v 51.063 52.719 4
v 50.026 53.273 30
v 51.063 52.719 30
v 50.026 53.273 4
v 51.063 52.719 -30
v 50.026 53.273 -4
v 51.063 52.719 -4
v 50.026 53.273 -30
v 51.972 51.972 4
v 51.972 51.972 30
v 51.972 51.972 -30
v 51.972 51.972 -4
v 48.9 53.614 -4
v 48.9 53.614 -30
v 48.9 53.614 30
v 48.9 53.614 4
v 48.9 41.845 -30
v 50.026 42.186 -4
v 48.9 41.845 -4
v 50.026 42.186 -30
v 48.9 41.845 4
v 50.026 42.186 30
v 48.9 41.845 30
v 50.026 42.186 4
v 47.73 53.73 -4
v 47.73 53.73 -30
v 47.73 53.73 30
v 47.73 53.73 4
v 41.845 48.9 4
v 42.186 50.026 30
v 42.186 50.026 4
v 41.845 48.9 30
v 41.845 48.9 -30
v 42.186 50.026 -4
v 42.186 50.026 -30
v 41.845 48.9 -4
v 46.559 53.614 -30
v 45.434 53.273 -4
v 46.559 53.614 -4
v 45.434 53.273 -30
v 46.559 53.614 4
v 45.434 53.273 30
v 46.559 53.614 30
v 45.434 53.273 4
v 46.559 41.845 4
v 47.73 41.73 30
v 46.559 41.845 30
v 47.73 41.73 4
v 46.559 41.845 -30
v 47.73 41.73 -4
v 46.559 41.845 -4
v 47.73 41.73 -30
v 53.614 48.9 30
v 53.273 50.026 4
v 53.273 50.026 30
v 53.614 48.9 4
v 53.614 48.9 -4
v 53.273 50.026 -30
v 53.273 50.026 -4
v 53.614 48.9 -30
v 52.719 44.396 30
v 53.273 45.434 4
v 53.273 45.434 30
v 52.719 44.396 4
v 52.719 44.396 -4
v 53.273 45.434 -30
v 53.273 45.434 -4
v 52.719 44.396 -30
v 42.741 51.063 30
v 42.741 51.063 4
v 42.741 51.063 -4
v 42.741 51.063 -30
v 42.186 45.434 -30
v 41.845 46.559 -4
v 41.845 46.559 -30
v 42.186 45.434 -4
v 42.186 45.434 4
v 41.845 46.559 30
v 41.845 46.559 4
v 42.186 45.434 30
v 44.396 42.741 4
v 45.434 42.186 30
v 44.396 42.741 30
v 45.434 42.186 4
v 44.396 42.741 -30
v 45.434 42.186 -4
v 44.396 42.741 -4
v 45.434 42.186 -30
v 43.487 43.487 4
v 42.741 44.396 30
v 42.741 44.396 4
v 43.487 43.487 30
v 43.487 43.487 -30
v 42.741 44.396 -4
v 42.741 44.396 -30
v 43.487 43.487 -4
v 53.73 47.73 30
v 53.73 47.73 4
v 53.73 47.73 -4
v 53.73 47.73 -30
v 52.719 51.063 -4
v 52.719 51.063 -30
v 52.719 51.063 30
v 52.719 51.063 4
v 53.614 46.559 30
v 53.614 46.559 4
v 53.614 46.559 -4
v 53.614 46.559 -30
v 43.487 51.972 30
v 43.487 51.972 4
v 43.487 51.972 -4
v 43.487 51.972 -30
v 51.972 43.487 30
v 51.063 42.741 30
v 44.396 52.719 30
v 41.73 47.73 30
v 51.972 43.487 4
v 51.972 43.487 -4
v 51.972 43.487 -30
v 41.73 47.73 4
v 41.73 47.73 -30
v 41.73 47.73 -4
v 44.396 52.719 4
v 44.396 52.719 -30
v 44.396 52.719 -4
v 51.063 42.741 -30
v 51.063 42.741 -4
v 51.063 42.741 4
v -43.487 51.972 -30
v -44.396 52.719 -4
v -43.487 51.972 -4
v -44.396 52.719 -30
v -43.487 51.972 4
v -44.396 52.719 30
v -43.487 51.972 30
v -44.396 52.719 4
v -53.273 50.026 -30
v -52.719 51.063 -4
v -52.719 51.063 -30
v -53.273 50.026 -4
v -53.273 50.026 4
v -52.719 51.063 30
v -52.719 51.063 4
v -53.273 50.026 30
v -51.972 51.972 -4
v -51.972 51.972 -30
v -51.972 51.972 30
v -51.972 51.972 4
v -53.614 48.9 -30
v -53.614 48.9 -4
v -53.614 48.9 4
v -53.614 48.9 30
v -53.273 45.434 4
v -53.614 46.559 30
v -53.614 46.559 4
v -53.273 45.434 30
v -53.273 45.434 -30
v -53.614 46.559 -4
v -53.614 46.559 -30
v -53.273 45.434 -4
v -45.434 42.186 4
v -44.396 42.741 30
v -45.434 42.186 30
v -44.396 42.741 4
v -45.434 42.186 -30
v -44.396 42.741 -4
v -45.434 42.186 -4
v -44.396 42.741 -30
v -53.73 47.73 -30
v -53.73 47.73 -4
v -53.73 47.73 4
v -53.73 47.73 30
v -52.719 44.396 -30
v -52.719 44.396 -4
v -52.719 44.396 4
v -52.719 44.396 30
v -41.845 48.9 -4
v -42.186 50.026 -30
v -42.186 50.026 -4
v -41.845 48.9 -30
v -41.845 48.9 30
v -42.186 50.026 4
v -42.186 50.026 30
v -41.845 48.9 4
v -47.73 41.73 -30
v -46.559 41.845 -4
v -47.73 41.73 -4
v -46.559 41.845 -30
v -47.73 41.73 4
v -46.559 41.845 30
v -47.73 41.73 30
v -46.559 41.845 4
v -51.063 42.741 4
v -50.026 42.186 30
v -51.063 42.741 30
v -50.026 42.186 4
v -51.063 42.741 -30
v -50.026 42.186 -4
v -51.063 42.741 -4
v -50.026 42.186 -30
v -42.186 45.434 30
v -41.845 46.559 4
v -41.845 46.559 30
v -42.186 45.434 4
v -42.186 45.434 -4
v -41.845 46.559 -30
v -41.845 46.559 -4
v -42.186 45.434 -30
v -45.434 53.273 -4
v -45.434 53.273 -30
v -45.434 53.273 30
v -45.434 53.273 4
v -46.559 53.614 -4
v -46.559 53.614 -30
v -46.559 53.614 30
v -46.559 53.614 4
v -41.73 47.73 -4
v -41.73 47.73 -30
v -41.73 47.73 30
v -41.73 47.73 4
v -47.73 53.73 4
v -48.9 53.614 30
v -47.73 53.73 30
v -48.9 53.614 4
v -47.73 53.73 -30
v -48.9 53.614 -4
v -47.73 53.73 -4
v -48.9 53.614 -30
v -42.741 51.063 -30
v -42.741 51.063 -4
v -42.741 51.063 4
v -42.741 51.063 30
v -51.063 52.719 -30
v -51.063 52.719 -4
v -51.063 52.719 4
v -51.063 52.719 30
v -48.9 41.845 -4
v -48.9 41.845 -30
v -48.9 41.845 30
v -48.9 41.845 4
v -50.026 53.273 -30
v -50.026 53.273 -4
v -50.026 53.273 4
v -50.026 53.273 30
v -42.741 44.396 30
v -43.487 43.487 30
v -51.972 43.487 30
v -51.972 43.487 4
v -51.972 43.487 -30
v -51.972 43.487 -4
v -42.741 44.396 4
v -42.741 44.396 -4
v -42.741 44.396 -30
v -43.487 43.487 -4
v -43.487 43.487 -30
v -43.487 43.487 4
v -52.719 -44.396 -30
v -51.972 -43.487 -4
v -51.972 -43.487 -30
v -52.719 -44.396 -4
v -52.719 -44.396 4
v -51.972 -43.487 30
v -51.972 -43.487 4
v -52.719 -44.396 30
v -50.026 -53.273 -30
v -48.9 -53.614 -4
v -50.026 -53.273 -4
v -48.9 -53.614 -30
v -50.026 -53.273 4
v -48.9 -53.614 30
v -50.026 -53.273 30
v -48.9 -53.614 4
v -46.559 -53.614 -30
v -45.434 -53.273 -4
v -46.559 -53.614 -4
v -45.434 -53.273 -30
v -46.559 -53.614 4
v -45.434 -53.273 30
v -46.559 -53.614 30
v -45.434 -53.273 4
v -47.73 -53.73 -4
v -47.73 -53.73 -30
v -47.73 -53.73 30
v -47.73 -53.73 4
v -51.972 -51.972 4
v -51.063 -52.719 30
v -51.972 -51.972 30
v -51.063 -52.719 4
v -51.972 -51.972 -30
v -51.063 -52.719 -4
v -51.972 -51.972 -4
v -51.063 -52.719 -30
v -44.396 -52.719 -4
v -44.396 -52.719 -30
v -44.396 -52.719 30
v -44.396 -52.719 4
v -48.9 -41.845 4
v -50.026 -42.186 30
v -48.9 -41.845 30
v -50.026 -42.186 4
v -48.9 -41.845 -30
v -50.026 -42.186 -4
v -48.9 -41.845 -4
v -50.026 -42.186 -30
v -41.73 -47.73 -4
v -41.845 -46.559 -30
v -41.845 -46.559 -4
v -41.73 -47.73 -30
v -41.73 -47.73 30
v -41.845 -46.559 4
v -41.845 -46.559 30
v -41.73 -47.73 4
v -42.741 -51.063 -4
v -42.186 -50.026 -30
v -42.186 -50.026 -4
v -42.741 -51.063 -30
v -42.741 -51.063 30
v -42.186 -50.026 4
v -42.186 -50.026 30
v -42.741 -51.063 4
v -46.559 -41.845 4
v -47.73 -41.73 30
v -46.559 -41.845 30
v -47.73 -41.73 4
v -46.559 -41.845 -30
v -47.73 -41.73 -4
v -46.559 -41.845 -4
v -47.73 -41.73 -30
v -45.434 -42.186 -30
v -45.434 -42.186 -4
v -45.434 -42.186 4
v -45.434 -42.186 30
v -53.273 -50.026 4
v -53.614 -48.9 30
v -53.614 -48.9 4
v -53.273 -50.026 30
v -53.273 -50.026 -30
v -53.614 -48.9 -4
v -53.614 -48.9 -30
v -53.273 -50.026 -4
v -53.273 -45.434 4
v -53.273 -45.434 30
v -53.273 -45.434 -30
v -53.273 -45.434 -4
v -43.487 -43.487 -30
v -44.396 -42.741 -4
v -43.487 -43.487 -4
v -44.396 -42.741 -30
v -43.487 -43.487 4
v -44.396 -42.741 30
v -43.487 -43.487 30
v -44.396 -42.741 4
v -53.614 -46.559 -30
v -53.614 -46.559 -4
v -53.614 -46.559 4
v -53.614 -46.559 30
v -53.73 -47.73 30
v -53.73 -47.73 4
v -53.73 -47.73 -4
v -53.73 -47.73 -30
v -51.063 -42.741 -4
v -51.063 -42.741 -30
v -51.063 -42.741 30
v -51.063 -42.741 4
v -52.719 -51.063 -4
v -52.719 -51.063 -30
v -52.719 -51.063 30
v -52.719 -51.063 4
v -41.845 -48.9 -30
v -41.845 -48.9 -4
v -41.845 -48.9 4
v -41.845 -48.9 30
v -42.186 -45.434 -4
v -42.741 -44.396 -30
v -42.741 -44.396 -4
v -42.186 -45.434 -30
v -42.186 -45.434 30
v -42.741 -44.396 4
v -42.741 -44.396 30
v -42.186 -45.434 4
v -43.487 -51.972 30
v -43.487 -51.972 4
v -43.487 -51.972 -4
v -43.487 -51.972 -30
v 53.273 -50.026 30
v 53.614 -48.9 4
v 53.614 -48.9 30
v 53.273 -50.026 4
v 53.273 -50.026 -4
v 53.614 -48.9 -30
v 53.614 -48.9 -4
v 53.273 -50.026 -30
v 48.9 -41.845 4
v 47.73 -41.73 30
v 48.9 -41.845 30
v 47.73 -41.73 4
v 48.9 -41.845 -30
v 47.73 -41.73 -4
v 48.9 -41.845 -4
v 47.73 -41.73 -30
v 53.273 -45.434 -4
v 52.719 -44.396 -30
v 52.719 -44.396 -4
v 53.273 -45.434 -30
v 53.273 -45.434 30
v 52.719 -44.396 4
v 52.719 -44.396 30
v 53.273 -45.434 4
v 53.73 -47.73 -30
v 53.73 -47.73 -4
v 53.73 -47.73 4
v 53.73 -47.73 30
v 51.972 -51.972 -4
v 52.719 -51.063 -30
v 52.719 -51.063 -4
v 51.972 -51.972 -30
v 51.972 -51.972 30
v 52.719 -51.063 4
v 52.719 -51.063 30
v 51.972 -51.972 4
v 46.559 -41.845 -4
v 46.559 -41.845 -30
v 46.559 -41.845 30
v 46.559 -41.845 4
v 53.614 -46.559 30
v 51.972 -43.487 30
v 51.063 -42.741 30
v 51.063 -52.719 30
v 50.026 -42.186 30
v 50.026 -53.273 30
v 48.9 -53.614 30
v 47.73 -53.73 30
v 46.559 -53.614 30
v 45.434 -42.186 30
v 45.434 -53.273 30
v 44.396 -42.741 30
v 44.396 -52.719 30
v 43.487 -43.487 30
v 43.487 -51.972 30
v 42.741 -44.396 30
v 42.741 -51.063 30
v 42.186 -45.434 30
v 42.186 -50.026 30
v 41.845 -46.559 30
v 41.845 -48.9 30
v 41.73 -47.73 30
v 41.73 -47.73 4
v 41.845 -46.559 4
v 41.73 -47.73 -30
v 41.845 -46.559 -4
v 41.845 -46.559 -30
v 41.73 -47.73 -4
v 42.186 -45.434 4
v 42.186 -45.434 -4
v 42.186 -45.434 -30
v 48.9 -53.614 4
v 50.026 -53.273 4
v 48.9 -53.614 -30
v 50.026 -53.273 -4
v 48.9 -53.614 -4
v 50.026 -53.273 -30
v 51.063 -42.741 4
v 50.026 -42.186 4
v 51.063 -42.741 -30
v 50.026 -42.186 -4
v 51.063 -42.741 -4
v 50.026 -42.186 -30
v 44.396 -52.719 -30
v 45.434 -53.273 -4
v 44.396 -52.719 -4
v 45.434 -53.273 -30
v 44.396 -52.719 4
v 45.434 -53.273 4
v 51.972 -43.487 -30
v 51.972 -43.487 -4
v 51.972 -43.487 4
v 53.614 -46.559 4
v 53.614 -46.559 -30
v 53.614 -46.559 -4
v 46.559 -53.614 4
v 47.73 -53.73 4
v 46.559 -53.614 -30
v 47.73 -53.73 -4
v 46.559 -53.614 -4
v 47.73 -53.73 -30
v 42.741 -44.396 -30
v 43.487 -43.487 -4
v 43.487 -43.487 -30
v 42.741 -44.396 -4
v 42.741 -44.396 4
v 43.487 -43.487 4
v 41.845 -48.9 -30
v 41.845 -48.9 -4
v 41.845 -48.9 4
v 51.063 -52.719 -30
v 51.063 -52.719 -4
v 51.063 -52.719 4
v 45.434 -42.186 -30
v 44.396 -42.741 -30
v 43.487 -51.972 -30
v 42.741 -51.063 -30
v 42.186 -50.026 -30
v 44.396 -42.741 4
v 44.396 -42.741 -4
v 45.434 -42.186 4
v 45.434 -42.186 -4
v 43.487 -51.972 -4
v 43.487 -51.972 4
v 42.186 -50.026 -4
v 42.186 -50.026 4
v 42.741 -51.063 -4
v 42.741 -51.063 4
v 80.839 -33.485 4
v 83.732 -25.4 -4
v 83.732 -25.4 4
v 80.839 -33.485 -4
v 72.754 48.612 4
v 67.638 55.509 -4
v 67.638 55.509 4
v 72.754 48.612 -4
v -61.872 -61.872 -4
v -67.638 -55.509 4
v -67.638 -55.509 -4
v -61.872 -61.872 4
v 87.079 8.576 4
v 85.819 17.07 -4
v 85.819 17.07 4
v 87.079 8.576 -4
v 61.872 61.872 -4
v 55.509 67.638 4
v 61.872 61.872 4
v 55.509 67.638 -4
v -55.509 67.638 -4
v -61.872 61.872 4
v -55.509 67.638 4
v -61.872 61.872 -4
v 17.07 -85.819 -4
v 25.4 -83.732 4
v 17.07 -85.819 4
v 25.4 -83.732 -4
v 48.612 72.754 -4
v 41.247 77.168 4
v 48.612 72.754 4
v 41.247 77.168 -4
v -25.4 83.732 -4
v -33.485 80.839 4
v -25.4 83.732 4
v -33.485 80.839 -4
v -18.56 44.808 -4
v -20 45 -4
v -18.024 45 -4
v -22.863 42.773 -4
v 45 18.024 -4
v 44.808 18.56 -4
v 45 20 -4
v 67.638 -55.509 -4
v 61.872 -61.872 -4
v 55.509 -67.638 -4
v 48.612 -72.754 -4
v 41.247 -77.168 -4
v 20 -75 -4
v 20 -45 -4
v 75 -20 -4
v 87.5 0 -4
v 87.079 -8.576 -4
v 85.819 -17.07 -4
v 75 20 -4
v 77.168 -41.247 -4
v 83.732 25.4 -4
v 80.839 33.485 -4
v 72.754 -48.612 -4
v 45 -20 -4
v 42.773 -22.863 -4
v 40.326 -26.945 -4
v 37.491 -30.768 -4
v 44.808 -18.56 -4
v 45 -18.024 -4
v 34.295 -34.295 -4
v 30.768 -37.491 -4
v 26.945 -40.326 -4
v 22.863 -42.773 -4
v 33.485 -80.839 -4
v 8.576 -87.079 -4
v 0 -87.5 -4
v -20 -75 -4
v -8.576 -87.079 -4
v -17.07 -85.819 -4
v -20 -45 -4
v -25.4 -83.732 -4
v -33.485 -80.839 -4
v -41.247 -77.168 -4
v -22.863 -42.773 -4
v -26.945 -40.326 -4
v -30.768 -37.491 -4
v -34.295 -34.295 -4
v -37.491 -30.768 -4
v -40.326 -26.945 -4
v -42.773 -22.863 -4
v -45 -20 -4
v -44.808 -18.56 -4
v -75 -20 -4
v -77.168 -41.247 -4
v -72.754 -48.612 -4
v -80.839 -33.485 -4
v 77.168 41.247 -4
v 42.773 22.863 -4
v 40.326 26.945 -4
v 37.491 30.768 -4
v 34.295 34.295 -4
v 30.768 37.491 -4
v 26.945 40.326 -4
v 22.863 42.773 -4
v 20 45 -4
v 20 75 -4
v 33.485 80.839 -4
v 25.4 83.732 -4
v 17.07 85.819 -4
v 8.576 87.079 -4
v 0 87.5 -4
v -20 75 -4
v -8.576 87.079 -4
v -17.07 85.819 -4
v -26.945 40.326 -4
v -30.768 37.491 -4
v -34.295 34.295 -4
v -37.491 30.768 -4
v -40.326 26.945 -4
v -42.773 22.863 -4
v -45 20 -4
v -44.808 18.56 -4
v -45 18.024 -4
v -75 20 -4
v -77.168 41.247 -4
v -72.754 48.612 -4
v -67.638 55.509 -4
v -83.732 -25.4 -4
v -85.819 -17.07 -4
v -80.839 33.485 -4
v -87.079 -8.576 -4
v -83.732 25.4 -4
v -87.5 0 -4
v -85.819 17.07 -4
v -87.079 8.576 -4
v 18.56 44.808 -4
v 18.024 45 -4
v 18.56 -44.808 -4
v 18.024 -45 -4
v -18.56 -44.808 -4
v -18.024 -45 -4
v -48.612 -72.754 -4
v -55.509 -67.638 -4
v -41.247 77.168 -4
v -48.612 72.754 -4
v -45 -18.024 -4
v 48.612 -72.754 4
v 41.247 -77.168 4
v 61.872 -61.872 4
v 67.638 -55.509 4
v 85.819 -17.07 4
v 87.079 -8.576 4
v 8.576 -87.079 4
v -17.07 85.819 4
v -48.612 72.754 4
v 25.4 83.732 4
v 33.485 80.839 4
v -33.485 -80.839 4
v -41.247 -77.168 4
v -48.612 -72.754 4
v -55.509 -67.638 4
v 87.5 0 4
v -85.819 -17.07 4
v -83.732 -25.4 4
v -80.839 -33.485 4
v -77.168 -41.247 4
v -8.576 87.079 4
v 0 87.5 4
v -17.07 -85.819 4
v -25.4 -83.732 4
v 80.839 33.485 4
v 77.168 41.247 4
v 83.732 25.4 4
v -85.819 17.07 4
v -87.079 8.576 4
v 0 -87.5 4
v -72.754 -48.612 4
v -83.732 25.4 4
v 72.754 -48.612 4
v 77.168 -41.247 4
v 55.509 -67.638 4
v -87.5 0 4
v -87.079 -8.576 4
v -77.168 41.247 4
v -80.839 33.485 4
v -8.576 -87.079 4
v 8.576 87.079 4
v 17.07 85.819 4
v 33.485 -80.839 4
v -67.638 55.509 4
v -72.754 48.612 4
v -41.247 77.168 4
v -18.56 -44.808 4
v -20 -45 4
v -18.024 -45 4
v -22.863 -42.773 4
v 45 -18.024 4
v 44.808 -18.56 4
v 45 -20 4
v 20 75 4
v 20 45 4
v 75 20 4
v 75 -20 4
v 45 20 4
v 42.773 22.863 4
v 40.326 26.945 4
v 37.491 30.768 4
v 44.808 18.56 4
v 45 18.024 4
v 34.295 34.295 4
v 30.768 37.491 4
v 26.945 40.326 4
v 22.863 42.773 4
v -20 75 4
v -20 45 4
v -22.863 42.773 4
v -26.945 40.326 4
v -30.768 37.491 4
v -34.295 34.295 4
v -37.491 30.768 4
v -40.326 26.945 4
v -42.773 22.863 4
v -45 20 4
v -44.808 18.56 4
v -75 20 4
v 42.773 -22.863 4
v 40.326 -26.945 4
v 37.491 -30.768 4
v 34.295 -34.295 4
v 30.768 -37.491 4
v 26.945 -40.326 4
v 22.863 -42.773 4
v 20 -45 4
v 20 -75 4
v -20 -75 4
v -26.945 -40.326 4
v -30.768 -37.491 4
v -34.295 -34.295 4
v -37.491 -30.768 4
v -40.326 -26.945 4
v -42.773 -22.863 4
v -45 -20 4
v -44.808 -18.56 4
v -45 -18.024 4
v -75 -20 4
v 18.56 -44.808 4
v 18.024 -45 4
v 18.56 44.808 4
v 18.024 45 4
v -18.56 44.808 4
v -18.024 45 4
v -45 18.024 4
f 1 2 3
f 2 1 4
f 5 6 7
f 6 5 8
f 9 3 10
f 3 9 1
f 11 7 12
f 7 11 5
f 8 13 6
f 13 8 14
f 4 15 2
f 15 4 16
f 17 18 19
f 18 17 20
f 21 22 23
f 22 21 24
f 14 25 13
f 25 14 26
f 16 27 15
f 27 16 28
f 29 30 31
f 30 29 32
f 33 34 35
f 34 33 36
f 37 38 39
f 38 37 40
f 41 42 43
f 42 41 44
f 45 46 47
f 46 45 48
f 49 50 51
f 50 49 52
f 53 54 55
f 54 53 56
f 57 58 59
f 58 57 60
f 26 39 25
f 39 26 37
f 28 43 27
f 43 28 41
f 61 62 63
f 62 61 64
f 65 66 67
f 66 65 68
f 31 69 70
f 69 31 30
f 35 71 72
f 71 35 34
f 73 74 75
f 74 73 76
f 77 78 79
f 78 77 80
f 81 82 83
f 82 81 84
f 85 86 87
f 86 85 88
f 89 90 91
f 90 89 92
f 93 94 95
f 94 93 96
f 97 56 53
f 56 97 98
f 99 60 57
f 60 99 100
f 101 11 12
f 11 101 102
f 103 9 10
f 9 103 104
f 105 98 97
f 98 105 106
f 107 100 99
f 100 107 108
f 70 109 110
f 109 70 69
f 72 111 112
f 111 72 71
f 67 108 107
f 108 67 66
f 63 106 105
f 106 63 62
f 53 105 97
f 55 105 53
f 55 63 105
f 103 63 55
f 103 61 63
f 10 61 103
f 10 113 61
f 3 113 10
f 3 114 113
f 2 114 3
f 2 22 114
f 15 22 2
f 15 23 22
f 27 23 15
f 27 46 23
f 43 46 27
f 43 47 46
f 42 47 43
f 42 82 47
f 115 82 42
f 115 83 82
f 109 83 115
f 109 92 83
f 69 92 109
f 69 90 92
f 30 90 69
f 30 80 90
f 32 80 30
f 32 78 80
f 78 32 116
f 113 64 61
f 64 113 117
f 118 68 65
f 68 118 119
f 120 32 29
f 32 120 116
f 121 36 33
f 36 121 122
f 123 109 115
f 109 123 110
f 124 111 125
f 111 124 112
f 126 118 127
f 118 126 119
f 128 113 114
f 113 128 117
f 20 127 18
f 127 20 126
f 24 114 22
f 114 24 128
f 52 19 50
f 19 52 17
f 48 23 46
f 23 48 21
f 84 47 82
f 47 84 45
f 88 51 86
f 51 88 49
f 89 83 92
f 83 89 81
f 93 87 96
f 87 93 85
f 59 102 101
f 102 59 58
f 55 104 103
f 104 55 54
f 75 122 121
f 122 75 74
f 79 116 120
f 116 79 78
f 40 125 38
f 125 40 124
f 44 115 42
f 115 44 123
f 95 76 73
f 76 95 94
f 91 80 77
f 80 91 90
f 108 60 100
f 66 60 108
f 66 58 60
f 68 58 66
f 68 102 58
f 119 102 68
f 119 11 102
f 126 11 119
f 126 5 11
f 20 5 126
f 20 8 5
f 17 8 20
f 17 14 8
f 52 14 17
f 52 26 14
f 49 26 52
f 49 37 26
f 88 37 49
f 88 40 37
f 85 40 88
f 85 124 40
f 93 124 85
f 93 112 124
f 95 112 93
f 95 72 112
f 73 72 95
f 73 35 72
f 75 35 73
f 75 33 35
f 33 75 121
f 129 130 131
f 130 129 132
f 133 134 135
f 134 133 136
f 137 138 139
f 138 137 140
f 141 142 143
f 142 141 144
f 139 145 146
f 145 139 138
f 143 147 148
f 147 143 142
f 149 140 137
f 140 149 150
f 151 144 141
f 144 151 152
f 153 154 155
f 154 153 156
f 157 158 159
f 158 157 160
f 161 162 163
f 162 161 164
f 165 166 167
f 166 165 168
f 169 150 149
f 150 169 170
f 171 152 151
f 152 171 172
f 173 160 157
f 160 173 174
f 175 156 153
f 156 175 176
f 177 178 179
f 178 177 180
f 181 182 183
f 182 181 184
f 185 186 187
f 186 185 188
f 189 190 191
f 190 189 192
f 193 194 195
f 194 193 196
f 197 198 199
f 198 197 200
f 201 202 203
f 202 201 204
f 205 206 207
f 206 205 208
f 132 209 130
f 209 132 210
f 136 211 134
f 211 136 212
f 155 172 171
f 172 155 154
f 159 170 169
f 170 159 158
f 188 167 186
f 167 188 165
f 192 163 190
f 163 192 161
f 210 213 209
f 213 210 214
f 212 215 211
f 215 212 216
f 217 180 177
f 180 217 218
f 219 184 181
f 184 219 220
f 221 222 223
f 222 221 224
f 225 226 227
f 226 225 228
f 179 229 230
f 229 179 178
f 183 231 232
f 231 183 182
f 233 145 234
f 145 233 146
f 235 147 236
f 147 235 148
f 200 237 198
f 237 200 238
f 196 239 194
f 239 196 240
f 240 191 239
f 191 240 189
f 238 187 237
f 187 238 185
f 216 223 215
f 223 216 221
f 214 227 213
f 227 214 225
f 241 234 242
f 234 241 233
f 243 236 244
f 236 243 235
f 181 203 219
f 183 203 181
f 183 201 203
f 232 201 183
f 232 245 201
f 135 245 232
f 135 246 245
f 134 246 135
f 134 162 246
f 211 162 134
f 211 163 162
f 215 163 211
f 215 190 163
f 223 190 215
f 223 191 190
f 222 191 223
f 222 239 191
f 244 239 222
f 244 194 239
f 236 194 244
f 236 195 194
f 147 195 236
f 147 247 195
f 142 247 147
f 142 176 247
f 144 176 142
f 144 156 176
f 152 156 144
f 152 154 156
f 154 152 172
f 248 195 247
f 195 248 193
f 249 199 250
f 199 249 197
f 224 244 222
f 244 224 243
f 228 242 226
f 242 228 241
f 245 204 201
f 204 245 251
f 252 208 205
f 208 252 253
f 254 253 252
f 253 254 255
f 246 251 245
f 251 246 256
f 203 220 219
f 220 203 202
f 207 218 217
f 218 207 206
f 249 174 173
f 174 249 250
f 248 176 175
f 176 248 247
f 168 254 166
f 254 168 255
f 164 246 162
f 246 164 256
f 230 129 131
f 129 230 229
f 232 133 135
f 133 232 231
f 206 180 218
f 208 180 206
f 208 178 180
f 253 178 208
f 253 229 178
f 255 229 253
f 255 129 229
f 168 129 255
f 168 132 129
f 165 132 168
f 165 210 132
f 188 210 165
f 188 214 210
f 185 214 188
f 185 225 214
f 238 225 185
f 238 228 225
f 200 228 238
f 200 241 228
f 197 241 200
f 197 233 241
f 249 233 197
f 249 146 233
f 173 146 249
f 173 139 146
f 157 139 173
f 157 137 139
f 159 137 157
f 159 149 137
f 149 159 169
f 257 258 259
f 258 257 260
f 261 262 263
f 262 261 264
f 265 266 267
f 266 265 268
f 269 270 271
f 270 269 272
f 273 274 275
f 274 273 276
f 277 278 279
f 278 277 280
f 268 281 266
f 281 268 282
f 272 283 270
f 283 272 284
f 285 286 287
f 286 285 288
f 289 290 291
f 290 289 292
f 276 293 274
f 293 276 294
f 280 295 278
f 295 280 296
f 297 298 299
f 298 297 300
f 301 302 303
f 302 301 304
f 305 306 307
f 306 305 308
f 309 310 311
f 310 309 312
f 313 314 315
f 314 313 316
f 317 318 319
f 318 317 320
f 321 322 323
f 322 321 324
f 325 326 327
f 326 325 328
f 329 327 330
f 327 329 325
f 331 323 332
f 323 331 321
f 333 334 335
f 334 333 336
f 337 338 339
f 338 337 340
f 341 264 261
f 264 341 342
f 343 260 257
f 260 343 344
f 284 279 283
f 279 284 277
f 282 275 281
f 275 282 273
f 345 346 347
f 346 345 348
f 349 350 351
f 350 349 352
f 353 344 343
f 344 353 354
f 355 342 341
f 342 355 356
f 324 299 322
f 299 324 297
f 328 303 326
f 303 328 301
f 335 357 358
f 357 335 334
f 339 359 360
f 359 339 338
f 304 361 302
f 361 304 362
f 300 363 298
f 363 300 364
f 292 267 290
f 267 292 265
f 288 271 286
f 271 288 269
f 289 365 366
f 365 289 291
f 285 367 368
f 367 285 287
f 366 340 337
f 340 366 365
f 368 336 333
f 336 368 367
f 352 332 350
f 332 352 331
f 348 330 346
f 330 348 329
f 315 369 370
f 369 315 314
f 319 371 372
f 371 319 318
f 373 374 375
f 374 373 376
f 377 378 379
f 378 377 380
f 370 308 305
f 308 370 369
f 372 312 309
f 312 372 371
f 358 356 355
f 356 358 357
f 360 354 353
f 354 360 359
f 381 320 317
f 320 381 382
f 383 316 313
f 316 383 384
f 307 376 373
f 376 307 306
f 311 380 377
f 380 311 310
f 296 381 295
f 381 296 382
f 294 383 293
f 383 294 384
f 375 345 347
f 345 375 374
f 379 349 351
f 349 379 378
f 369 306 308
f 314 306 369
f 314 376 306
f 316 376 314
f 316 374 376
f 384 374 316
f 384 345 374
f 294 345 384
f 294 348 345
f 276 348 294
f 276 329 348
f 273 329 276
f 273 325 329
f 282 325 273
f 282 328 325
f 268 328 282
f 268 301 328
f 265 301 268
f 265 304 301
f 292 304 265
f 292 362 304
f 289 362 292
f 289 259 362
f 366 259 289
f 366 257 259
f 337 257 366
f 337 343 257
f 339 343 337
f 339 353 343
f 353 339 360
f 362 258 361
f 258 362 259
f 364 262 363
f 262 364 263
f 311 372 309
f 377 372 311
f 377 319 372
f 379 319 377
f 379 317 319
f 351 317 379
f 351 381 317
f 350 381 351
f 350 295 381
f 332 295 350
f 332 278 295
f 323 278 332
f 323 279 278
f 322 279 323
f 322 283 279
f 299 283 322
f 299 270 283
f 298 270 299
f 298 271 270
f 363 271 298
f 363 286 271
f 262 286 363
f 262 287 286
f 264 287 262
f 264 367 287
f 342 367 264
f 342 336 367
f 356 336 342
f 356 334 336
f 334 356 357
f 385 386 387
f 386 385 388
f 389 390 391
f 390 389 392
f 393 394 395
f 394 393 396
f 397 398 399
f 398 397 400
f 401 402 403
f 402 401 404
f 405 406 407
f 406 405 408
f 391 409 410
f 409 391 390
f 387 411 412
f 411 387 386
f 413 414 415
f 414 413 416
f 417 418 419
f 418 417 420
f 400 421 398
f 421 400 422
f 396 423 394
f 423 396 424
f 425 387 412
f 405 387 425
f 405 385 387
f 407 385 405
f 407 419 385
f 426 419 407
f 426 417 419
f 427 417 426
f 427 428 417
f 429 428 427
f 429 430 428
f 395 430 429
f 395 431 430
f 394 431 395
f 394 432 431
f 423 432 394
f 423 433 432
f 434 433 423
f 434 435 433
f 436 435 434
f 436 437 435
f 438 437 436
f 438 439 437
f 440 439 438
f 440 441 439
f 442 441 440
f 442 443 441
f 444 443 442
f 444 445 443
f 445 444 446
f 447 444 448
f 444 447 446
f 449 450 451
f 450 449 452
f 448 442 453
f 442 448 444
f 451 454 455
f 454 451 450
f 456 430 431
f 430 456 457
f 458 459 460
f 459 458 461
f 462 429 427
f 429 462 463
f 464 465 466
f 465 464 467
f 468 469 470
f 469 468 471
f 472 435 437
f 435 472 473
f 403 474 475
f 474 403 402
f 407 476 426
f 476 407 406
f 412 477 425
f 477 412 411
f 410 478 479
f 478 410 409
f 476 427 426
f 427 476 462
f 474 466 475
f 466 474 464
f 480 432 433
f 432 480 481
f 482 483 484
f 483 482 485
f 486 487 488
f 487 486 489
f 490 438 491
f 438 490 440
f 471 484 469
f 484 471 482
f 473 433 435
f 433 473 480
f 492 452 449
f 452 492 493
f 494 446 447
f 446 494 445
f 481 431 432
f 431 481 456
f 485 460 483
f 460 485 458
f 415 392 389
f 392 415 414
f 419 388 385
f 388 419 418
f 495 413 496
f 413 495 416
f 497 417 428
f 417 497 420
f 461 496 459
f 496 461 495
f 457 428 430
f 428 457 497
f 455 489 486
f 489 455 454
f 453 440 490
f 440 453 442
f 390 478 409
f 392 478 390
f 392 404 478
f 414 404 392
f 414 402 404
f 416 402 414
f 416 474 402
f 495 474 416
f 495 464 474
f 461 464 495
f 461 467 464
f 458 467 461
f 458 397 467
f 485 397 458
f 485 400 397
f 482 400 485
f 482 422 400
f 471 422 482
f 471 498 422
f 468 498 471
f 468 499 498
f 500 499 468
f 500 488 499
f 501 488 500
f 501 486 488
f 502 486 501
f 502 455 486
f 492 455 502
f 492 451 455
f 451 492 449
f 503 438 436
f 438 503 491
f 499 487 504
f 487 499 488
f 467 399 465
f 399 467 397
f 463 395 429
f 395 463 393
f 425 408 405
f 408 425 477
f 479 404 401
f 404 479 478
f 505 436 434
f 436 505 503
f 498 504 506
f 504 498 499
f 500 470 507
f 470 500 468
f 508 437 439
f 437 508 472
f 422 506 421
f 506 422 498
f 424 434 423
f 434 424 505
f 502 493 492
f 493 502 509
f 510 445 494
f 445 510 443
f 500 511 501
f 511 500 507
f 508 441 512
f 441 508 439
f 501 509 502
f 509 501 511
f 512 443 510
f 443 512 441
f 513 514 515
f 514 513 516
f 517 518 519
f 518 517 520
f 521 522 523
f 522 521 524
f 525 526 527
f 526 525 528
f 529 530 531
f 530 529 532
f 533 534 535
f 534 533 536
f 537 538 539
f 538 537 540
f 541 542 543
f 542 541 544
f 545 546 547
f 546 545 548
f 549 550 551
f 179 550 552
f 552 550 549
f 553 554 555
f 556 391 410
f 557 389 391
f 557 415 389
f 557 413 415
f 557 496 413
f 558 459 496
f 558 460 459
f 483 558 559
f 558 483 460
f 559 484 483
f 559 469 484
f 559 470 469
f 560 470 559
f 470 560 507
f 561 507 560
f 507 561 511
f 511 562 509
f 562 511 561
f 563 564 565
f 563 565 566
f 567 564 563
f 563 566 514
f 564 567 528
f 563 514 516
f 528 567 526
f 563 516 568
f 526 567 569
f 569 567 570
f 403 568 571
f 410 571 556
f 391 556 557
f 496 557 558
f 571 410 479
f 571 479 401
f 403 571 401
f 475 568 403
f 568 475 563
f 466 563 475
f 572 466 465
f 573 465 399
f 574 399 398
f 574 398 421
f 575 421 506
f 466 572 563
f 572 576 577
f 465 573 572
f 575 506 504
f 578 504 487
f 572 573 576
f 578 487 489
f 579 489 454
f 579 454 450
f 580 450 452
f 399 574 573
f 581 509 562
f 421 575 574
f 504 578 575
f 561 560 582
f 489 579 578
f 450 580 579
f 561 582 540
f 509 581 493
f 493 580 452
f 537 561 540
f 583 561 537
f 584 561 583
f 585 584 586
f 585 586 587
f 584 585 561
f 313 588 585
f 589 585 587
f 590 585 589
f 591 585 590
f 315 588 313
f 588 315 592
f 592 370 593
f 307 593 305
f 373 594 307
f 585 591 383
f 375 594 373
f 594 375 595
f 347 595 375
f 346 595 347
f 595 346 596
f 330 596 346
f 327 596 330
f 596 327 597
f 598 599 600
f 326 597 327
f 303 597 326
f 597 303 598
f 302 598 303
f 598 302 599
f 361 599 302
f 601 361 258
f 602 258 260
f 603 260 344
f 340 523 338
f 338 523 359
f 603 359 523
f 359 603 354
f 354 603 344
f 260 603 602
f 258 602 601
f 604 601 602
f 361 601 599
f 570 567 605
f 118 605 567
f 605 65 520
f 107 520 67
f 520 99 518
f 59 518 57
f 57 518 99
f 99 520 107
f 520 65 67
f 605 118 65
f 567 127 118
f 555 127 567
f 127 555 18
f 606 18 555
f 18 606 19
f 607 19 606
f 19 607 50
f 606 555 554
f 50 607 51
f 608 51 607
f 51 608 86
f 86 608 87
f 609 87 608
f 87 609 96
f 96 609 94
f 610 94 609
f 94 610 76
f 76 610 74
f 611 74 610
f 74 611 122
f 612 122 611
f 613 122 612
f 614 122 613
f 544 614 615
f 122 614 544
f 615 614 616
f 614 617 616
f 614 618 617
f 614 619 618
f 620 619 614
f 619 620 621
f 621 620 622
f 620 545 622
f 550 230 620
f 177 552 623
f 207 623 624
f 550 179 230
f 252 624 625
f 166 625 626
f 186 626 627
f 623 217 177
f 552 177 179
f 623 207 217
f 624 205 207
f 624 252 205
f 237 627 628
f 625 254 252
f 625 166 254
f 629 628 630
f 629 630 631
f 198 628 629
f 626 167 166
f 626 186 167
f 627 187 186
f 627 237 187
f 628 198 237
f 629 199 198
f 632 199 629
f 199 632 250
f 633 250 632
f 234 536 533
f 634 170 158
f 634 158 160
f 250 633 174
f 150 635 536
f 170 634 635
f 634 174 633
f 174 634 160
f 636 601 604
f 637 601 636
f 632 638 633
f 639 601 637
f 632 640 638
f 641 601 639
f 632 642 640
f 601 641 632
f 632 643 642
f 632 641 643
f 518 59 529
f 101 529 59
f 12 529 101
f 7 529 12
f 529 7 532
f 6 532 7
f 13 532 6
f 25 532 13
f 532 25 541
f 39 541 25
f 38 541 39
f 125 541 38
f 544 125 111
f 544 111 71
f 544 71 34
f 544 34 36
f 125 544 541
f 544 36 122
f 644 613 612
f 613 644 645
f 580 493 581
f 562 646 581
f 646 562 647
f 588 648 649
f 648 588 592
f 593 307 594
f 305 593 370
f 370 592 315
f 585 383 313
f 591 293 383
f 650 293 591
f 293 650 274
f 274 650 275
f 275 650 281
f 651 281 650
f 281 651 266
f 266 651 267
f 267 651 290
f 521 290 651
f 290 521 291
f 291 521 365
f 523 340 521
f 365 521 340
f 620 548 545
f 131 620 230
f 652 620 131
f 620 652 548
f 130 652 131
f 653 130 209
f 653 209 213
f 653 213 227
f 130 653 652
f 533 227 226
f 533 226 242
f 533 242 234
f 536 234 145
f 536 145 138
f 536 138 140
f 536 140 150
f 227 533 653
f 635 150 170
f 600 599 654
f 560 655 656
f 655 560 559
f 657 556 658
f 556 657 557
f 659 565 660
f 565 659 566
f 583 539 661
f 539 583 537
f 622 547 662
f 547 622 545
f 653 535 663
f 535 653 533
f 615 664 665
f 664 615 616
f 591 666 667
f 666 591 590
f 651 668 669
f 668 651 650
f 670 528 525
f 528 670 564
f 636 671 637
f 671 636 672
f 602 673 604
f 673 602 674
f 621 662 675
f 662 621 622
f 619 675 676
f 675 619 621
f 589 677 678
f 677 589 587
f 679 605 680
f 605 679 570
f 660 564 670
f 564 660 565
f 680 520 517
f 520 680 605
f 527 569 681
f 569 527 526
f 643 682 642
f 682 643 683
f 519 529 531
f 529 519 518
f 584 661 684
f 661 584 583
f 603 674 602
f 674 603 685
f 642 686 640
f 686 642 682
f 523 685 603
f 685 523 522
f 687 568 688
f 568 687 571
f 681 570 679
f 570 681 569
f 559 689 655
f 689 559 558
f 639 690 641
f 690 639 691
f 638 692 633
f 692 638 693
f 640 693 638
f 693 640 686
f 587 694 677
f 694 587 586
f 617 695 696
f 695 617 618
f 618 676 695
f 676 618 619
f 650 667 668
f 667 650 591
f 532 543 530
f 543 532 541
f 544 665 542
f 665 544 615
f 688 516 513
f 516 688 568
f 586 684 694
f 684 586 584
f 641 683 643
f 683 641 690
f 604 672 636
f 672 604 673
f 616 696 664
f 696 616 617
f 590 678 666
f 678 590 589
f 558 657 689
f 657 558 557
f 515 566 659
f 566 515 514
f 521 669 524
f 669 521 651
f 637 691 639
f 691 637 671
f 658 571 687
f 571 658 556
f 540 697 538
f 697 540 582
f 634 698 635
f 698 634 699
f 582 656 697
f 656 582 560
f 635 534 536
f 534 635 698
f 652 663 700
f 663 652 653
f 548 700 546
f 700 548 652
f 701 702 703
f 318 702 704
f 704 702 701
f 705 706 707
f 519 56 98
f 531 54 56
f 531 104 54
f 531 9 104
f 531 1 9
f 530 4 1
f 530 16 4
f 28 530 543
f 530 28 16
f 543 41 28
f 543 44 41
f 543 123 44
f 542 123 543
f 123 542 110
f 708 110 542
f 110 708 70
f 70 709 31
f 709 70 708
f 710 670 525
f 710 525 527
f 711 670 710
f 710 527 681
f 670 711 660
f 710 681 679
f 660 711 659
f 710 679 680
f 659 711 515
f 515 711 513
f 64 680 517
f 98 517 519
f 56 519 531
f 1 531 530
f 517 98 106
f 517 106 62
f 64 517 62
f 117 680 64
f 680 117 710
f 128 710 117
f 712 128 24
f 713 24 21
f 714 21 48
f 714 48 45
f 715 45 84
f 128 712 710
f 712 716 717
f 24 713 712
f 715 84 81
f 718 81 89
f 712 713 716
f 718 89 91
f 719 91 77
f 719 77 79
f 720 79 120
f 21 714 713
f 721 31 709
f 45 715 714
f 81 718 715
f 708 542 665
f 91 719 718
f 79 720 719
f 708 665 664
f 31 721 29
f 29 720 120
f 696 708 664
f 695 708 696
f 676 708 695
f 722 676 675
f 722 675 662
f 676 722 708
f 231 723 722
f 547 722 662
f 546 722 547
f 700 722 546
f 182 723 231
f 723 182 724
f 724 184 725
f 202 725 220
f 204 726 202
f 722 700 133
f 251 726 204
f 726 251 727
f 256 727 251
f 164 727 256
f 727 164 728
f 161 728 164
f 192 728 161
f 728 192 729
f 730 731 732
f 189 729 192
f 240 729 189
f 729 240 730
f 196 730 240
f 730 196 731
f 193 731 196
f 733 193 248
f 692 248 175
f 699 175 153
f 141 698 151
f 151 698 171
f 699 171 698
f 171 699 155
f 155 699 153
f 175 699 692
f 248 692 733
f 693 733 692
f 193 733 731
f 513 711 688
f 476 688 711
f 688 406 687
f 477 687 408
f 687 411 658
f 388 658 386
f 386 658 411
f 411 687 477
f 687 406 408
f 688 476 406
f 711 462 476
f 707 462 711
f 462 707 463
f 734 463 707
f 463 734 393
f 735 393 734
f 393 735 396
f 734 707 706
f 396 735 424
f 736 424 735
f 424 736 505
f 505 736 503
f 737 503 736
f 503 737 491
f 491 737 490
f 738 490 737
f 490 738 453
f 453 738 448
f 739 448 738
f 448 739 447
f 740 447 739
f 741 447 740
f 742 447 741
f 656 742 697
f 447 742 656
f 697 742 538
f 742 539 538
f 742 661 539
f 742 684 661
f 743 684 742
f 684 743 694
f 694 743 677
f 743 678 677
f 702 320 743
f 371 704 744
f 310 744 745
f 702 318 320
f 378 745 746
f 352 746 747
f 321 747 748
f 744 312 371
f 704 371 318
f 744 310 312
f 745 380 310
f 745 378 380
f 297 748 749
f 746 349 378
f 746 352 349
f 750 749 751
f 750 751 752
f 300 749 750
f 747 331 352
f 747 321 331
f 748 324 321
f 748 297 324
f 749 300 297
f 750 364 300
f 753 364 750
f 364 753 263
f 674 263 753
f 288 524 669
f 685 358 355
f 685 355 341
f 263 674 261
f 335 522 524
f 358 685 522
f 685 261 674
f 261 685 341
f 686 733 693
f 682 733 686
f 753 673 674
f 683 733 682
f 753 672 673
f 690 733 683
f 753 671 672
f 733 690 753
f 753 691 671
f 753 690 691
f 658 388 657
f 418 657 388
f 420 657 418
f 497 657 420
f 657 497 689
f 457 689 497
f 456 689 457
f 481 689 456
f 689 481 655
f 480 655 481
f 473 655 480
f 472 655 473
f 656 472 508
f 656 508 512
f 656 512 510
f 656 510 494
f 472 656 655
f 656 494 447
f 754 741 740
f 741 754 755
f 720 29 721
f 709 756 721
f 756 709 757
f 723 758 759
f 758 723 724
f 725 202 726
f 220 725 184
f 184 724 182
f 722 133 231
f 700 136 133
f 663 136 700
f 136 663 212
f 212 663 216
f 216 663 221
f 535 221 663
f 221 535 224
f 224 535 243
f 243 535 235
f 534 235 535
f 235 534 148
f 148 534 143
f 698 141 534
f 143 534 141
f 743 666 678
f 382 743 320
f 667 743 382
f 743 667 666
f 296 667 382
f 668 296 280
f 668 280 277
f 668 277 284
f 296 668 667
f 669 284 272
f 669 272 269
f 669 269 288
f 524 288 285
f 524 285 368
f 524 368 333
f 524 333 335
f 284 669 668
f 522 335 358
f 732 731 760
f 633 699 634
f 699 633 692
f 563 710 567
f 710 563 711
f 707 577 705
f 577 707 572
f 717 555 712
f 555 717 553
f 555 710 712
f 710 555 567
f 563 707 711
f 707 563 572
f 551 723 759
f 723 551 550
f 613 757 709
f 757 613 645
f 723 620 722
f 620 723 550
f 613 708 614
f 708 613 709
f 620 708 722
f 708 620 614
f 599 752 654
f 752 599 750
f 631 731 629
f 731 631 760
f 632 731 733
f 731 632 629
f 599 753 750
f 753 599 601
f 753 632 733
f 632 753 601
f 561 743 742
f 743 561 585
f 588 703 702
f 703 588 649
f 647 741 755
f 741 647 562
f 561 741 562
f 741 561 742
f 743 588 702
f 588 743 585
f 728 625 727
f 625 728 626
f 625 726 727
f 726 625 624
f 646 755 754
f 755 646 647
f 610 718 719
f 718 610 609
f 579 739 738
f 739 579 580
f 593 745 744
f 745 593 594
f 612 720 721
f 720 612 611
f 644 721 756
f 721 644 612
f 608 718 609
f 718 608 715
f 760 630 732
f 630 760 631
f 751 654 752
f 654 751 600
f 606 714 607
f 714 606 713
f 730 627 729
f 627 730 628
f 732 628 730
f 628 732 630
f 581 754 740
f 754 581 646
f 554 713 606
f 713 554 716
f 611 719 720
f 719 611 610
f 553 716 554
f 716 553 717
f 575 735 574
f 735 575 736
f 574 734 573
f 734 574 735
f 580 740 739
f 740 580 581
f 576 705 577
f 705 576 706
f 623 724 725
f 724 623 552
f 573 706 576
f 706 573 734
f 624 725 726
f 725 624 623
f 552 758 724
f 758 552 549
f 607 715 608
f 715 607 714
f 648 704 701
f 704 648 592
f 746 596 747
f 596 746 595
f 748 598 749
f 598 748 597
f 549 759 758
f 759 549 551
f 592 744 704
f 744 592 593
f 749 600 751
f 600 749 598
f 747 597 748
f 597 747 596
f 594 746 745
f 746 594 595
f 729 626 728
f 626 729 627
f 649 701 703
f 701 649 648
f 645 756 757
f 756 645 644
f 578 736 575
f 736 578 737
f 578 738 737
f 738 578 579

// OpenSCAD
/*
 * ASSEMBLY_JIG.scad
 * Flat assembly jig that holds the platter stack perfectly straight during clamping.
 * Critical for even gaps and alignment.
 * From the May 2026 Grok design conversation.
 */

module assembly_jig() {
    difference() {
        union() {
            // Base plate
            cylinder(d=95 + 80, h=8, center=true, $fn=64);
            // Tall guide posts (match platter OD + clearance)
            for (i = [0:3]) {
                rotate([0,0,i*90 + 45])
                    translate([95/2 + 20, 0, 0])
                        cylinder(d=12, h=60, center=true, $fn=32);
            }
        }
        // Central clearance for the stack during assembly
        cylinder(d=95 + 2, h=10, center=true, $fn=64);
        
        // Access windows / cutouts for fingers/tools
        for (i = [0:3]) {
            rotate([0,0,i*90])
                translate([60, 0, 0])
                    cube([30, 40, 12], center=true);
        }
    }
}

assembly_jig();
